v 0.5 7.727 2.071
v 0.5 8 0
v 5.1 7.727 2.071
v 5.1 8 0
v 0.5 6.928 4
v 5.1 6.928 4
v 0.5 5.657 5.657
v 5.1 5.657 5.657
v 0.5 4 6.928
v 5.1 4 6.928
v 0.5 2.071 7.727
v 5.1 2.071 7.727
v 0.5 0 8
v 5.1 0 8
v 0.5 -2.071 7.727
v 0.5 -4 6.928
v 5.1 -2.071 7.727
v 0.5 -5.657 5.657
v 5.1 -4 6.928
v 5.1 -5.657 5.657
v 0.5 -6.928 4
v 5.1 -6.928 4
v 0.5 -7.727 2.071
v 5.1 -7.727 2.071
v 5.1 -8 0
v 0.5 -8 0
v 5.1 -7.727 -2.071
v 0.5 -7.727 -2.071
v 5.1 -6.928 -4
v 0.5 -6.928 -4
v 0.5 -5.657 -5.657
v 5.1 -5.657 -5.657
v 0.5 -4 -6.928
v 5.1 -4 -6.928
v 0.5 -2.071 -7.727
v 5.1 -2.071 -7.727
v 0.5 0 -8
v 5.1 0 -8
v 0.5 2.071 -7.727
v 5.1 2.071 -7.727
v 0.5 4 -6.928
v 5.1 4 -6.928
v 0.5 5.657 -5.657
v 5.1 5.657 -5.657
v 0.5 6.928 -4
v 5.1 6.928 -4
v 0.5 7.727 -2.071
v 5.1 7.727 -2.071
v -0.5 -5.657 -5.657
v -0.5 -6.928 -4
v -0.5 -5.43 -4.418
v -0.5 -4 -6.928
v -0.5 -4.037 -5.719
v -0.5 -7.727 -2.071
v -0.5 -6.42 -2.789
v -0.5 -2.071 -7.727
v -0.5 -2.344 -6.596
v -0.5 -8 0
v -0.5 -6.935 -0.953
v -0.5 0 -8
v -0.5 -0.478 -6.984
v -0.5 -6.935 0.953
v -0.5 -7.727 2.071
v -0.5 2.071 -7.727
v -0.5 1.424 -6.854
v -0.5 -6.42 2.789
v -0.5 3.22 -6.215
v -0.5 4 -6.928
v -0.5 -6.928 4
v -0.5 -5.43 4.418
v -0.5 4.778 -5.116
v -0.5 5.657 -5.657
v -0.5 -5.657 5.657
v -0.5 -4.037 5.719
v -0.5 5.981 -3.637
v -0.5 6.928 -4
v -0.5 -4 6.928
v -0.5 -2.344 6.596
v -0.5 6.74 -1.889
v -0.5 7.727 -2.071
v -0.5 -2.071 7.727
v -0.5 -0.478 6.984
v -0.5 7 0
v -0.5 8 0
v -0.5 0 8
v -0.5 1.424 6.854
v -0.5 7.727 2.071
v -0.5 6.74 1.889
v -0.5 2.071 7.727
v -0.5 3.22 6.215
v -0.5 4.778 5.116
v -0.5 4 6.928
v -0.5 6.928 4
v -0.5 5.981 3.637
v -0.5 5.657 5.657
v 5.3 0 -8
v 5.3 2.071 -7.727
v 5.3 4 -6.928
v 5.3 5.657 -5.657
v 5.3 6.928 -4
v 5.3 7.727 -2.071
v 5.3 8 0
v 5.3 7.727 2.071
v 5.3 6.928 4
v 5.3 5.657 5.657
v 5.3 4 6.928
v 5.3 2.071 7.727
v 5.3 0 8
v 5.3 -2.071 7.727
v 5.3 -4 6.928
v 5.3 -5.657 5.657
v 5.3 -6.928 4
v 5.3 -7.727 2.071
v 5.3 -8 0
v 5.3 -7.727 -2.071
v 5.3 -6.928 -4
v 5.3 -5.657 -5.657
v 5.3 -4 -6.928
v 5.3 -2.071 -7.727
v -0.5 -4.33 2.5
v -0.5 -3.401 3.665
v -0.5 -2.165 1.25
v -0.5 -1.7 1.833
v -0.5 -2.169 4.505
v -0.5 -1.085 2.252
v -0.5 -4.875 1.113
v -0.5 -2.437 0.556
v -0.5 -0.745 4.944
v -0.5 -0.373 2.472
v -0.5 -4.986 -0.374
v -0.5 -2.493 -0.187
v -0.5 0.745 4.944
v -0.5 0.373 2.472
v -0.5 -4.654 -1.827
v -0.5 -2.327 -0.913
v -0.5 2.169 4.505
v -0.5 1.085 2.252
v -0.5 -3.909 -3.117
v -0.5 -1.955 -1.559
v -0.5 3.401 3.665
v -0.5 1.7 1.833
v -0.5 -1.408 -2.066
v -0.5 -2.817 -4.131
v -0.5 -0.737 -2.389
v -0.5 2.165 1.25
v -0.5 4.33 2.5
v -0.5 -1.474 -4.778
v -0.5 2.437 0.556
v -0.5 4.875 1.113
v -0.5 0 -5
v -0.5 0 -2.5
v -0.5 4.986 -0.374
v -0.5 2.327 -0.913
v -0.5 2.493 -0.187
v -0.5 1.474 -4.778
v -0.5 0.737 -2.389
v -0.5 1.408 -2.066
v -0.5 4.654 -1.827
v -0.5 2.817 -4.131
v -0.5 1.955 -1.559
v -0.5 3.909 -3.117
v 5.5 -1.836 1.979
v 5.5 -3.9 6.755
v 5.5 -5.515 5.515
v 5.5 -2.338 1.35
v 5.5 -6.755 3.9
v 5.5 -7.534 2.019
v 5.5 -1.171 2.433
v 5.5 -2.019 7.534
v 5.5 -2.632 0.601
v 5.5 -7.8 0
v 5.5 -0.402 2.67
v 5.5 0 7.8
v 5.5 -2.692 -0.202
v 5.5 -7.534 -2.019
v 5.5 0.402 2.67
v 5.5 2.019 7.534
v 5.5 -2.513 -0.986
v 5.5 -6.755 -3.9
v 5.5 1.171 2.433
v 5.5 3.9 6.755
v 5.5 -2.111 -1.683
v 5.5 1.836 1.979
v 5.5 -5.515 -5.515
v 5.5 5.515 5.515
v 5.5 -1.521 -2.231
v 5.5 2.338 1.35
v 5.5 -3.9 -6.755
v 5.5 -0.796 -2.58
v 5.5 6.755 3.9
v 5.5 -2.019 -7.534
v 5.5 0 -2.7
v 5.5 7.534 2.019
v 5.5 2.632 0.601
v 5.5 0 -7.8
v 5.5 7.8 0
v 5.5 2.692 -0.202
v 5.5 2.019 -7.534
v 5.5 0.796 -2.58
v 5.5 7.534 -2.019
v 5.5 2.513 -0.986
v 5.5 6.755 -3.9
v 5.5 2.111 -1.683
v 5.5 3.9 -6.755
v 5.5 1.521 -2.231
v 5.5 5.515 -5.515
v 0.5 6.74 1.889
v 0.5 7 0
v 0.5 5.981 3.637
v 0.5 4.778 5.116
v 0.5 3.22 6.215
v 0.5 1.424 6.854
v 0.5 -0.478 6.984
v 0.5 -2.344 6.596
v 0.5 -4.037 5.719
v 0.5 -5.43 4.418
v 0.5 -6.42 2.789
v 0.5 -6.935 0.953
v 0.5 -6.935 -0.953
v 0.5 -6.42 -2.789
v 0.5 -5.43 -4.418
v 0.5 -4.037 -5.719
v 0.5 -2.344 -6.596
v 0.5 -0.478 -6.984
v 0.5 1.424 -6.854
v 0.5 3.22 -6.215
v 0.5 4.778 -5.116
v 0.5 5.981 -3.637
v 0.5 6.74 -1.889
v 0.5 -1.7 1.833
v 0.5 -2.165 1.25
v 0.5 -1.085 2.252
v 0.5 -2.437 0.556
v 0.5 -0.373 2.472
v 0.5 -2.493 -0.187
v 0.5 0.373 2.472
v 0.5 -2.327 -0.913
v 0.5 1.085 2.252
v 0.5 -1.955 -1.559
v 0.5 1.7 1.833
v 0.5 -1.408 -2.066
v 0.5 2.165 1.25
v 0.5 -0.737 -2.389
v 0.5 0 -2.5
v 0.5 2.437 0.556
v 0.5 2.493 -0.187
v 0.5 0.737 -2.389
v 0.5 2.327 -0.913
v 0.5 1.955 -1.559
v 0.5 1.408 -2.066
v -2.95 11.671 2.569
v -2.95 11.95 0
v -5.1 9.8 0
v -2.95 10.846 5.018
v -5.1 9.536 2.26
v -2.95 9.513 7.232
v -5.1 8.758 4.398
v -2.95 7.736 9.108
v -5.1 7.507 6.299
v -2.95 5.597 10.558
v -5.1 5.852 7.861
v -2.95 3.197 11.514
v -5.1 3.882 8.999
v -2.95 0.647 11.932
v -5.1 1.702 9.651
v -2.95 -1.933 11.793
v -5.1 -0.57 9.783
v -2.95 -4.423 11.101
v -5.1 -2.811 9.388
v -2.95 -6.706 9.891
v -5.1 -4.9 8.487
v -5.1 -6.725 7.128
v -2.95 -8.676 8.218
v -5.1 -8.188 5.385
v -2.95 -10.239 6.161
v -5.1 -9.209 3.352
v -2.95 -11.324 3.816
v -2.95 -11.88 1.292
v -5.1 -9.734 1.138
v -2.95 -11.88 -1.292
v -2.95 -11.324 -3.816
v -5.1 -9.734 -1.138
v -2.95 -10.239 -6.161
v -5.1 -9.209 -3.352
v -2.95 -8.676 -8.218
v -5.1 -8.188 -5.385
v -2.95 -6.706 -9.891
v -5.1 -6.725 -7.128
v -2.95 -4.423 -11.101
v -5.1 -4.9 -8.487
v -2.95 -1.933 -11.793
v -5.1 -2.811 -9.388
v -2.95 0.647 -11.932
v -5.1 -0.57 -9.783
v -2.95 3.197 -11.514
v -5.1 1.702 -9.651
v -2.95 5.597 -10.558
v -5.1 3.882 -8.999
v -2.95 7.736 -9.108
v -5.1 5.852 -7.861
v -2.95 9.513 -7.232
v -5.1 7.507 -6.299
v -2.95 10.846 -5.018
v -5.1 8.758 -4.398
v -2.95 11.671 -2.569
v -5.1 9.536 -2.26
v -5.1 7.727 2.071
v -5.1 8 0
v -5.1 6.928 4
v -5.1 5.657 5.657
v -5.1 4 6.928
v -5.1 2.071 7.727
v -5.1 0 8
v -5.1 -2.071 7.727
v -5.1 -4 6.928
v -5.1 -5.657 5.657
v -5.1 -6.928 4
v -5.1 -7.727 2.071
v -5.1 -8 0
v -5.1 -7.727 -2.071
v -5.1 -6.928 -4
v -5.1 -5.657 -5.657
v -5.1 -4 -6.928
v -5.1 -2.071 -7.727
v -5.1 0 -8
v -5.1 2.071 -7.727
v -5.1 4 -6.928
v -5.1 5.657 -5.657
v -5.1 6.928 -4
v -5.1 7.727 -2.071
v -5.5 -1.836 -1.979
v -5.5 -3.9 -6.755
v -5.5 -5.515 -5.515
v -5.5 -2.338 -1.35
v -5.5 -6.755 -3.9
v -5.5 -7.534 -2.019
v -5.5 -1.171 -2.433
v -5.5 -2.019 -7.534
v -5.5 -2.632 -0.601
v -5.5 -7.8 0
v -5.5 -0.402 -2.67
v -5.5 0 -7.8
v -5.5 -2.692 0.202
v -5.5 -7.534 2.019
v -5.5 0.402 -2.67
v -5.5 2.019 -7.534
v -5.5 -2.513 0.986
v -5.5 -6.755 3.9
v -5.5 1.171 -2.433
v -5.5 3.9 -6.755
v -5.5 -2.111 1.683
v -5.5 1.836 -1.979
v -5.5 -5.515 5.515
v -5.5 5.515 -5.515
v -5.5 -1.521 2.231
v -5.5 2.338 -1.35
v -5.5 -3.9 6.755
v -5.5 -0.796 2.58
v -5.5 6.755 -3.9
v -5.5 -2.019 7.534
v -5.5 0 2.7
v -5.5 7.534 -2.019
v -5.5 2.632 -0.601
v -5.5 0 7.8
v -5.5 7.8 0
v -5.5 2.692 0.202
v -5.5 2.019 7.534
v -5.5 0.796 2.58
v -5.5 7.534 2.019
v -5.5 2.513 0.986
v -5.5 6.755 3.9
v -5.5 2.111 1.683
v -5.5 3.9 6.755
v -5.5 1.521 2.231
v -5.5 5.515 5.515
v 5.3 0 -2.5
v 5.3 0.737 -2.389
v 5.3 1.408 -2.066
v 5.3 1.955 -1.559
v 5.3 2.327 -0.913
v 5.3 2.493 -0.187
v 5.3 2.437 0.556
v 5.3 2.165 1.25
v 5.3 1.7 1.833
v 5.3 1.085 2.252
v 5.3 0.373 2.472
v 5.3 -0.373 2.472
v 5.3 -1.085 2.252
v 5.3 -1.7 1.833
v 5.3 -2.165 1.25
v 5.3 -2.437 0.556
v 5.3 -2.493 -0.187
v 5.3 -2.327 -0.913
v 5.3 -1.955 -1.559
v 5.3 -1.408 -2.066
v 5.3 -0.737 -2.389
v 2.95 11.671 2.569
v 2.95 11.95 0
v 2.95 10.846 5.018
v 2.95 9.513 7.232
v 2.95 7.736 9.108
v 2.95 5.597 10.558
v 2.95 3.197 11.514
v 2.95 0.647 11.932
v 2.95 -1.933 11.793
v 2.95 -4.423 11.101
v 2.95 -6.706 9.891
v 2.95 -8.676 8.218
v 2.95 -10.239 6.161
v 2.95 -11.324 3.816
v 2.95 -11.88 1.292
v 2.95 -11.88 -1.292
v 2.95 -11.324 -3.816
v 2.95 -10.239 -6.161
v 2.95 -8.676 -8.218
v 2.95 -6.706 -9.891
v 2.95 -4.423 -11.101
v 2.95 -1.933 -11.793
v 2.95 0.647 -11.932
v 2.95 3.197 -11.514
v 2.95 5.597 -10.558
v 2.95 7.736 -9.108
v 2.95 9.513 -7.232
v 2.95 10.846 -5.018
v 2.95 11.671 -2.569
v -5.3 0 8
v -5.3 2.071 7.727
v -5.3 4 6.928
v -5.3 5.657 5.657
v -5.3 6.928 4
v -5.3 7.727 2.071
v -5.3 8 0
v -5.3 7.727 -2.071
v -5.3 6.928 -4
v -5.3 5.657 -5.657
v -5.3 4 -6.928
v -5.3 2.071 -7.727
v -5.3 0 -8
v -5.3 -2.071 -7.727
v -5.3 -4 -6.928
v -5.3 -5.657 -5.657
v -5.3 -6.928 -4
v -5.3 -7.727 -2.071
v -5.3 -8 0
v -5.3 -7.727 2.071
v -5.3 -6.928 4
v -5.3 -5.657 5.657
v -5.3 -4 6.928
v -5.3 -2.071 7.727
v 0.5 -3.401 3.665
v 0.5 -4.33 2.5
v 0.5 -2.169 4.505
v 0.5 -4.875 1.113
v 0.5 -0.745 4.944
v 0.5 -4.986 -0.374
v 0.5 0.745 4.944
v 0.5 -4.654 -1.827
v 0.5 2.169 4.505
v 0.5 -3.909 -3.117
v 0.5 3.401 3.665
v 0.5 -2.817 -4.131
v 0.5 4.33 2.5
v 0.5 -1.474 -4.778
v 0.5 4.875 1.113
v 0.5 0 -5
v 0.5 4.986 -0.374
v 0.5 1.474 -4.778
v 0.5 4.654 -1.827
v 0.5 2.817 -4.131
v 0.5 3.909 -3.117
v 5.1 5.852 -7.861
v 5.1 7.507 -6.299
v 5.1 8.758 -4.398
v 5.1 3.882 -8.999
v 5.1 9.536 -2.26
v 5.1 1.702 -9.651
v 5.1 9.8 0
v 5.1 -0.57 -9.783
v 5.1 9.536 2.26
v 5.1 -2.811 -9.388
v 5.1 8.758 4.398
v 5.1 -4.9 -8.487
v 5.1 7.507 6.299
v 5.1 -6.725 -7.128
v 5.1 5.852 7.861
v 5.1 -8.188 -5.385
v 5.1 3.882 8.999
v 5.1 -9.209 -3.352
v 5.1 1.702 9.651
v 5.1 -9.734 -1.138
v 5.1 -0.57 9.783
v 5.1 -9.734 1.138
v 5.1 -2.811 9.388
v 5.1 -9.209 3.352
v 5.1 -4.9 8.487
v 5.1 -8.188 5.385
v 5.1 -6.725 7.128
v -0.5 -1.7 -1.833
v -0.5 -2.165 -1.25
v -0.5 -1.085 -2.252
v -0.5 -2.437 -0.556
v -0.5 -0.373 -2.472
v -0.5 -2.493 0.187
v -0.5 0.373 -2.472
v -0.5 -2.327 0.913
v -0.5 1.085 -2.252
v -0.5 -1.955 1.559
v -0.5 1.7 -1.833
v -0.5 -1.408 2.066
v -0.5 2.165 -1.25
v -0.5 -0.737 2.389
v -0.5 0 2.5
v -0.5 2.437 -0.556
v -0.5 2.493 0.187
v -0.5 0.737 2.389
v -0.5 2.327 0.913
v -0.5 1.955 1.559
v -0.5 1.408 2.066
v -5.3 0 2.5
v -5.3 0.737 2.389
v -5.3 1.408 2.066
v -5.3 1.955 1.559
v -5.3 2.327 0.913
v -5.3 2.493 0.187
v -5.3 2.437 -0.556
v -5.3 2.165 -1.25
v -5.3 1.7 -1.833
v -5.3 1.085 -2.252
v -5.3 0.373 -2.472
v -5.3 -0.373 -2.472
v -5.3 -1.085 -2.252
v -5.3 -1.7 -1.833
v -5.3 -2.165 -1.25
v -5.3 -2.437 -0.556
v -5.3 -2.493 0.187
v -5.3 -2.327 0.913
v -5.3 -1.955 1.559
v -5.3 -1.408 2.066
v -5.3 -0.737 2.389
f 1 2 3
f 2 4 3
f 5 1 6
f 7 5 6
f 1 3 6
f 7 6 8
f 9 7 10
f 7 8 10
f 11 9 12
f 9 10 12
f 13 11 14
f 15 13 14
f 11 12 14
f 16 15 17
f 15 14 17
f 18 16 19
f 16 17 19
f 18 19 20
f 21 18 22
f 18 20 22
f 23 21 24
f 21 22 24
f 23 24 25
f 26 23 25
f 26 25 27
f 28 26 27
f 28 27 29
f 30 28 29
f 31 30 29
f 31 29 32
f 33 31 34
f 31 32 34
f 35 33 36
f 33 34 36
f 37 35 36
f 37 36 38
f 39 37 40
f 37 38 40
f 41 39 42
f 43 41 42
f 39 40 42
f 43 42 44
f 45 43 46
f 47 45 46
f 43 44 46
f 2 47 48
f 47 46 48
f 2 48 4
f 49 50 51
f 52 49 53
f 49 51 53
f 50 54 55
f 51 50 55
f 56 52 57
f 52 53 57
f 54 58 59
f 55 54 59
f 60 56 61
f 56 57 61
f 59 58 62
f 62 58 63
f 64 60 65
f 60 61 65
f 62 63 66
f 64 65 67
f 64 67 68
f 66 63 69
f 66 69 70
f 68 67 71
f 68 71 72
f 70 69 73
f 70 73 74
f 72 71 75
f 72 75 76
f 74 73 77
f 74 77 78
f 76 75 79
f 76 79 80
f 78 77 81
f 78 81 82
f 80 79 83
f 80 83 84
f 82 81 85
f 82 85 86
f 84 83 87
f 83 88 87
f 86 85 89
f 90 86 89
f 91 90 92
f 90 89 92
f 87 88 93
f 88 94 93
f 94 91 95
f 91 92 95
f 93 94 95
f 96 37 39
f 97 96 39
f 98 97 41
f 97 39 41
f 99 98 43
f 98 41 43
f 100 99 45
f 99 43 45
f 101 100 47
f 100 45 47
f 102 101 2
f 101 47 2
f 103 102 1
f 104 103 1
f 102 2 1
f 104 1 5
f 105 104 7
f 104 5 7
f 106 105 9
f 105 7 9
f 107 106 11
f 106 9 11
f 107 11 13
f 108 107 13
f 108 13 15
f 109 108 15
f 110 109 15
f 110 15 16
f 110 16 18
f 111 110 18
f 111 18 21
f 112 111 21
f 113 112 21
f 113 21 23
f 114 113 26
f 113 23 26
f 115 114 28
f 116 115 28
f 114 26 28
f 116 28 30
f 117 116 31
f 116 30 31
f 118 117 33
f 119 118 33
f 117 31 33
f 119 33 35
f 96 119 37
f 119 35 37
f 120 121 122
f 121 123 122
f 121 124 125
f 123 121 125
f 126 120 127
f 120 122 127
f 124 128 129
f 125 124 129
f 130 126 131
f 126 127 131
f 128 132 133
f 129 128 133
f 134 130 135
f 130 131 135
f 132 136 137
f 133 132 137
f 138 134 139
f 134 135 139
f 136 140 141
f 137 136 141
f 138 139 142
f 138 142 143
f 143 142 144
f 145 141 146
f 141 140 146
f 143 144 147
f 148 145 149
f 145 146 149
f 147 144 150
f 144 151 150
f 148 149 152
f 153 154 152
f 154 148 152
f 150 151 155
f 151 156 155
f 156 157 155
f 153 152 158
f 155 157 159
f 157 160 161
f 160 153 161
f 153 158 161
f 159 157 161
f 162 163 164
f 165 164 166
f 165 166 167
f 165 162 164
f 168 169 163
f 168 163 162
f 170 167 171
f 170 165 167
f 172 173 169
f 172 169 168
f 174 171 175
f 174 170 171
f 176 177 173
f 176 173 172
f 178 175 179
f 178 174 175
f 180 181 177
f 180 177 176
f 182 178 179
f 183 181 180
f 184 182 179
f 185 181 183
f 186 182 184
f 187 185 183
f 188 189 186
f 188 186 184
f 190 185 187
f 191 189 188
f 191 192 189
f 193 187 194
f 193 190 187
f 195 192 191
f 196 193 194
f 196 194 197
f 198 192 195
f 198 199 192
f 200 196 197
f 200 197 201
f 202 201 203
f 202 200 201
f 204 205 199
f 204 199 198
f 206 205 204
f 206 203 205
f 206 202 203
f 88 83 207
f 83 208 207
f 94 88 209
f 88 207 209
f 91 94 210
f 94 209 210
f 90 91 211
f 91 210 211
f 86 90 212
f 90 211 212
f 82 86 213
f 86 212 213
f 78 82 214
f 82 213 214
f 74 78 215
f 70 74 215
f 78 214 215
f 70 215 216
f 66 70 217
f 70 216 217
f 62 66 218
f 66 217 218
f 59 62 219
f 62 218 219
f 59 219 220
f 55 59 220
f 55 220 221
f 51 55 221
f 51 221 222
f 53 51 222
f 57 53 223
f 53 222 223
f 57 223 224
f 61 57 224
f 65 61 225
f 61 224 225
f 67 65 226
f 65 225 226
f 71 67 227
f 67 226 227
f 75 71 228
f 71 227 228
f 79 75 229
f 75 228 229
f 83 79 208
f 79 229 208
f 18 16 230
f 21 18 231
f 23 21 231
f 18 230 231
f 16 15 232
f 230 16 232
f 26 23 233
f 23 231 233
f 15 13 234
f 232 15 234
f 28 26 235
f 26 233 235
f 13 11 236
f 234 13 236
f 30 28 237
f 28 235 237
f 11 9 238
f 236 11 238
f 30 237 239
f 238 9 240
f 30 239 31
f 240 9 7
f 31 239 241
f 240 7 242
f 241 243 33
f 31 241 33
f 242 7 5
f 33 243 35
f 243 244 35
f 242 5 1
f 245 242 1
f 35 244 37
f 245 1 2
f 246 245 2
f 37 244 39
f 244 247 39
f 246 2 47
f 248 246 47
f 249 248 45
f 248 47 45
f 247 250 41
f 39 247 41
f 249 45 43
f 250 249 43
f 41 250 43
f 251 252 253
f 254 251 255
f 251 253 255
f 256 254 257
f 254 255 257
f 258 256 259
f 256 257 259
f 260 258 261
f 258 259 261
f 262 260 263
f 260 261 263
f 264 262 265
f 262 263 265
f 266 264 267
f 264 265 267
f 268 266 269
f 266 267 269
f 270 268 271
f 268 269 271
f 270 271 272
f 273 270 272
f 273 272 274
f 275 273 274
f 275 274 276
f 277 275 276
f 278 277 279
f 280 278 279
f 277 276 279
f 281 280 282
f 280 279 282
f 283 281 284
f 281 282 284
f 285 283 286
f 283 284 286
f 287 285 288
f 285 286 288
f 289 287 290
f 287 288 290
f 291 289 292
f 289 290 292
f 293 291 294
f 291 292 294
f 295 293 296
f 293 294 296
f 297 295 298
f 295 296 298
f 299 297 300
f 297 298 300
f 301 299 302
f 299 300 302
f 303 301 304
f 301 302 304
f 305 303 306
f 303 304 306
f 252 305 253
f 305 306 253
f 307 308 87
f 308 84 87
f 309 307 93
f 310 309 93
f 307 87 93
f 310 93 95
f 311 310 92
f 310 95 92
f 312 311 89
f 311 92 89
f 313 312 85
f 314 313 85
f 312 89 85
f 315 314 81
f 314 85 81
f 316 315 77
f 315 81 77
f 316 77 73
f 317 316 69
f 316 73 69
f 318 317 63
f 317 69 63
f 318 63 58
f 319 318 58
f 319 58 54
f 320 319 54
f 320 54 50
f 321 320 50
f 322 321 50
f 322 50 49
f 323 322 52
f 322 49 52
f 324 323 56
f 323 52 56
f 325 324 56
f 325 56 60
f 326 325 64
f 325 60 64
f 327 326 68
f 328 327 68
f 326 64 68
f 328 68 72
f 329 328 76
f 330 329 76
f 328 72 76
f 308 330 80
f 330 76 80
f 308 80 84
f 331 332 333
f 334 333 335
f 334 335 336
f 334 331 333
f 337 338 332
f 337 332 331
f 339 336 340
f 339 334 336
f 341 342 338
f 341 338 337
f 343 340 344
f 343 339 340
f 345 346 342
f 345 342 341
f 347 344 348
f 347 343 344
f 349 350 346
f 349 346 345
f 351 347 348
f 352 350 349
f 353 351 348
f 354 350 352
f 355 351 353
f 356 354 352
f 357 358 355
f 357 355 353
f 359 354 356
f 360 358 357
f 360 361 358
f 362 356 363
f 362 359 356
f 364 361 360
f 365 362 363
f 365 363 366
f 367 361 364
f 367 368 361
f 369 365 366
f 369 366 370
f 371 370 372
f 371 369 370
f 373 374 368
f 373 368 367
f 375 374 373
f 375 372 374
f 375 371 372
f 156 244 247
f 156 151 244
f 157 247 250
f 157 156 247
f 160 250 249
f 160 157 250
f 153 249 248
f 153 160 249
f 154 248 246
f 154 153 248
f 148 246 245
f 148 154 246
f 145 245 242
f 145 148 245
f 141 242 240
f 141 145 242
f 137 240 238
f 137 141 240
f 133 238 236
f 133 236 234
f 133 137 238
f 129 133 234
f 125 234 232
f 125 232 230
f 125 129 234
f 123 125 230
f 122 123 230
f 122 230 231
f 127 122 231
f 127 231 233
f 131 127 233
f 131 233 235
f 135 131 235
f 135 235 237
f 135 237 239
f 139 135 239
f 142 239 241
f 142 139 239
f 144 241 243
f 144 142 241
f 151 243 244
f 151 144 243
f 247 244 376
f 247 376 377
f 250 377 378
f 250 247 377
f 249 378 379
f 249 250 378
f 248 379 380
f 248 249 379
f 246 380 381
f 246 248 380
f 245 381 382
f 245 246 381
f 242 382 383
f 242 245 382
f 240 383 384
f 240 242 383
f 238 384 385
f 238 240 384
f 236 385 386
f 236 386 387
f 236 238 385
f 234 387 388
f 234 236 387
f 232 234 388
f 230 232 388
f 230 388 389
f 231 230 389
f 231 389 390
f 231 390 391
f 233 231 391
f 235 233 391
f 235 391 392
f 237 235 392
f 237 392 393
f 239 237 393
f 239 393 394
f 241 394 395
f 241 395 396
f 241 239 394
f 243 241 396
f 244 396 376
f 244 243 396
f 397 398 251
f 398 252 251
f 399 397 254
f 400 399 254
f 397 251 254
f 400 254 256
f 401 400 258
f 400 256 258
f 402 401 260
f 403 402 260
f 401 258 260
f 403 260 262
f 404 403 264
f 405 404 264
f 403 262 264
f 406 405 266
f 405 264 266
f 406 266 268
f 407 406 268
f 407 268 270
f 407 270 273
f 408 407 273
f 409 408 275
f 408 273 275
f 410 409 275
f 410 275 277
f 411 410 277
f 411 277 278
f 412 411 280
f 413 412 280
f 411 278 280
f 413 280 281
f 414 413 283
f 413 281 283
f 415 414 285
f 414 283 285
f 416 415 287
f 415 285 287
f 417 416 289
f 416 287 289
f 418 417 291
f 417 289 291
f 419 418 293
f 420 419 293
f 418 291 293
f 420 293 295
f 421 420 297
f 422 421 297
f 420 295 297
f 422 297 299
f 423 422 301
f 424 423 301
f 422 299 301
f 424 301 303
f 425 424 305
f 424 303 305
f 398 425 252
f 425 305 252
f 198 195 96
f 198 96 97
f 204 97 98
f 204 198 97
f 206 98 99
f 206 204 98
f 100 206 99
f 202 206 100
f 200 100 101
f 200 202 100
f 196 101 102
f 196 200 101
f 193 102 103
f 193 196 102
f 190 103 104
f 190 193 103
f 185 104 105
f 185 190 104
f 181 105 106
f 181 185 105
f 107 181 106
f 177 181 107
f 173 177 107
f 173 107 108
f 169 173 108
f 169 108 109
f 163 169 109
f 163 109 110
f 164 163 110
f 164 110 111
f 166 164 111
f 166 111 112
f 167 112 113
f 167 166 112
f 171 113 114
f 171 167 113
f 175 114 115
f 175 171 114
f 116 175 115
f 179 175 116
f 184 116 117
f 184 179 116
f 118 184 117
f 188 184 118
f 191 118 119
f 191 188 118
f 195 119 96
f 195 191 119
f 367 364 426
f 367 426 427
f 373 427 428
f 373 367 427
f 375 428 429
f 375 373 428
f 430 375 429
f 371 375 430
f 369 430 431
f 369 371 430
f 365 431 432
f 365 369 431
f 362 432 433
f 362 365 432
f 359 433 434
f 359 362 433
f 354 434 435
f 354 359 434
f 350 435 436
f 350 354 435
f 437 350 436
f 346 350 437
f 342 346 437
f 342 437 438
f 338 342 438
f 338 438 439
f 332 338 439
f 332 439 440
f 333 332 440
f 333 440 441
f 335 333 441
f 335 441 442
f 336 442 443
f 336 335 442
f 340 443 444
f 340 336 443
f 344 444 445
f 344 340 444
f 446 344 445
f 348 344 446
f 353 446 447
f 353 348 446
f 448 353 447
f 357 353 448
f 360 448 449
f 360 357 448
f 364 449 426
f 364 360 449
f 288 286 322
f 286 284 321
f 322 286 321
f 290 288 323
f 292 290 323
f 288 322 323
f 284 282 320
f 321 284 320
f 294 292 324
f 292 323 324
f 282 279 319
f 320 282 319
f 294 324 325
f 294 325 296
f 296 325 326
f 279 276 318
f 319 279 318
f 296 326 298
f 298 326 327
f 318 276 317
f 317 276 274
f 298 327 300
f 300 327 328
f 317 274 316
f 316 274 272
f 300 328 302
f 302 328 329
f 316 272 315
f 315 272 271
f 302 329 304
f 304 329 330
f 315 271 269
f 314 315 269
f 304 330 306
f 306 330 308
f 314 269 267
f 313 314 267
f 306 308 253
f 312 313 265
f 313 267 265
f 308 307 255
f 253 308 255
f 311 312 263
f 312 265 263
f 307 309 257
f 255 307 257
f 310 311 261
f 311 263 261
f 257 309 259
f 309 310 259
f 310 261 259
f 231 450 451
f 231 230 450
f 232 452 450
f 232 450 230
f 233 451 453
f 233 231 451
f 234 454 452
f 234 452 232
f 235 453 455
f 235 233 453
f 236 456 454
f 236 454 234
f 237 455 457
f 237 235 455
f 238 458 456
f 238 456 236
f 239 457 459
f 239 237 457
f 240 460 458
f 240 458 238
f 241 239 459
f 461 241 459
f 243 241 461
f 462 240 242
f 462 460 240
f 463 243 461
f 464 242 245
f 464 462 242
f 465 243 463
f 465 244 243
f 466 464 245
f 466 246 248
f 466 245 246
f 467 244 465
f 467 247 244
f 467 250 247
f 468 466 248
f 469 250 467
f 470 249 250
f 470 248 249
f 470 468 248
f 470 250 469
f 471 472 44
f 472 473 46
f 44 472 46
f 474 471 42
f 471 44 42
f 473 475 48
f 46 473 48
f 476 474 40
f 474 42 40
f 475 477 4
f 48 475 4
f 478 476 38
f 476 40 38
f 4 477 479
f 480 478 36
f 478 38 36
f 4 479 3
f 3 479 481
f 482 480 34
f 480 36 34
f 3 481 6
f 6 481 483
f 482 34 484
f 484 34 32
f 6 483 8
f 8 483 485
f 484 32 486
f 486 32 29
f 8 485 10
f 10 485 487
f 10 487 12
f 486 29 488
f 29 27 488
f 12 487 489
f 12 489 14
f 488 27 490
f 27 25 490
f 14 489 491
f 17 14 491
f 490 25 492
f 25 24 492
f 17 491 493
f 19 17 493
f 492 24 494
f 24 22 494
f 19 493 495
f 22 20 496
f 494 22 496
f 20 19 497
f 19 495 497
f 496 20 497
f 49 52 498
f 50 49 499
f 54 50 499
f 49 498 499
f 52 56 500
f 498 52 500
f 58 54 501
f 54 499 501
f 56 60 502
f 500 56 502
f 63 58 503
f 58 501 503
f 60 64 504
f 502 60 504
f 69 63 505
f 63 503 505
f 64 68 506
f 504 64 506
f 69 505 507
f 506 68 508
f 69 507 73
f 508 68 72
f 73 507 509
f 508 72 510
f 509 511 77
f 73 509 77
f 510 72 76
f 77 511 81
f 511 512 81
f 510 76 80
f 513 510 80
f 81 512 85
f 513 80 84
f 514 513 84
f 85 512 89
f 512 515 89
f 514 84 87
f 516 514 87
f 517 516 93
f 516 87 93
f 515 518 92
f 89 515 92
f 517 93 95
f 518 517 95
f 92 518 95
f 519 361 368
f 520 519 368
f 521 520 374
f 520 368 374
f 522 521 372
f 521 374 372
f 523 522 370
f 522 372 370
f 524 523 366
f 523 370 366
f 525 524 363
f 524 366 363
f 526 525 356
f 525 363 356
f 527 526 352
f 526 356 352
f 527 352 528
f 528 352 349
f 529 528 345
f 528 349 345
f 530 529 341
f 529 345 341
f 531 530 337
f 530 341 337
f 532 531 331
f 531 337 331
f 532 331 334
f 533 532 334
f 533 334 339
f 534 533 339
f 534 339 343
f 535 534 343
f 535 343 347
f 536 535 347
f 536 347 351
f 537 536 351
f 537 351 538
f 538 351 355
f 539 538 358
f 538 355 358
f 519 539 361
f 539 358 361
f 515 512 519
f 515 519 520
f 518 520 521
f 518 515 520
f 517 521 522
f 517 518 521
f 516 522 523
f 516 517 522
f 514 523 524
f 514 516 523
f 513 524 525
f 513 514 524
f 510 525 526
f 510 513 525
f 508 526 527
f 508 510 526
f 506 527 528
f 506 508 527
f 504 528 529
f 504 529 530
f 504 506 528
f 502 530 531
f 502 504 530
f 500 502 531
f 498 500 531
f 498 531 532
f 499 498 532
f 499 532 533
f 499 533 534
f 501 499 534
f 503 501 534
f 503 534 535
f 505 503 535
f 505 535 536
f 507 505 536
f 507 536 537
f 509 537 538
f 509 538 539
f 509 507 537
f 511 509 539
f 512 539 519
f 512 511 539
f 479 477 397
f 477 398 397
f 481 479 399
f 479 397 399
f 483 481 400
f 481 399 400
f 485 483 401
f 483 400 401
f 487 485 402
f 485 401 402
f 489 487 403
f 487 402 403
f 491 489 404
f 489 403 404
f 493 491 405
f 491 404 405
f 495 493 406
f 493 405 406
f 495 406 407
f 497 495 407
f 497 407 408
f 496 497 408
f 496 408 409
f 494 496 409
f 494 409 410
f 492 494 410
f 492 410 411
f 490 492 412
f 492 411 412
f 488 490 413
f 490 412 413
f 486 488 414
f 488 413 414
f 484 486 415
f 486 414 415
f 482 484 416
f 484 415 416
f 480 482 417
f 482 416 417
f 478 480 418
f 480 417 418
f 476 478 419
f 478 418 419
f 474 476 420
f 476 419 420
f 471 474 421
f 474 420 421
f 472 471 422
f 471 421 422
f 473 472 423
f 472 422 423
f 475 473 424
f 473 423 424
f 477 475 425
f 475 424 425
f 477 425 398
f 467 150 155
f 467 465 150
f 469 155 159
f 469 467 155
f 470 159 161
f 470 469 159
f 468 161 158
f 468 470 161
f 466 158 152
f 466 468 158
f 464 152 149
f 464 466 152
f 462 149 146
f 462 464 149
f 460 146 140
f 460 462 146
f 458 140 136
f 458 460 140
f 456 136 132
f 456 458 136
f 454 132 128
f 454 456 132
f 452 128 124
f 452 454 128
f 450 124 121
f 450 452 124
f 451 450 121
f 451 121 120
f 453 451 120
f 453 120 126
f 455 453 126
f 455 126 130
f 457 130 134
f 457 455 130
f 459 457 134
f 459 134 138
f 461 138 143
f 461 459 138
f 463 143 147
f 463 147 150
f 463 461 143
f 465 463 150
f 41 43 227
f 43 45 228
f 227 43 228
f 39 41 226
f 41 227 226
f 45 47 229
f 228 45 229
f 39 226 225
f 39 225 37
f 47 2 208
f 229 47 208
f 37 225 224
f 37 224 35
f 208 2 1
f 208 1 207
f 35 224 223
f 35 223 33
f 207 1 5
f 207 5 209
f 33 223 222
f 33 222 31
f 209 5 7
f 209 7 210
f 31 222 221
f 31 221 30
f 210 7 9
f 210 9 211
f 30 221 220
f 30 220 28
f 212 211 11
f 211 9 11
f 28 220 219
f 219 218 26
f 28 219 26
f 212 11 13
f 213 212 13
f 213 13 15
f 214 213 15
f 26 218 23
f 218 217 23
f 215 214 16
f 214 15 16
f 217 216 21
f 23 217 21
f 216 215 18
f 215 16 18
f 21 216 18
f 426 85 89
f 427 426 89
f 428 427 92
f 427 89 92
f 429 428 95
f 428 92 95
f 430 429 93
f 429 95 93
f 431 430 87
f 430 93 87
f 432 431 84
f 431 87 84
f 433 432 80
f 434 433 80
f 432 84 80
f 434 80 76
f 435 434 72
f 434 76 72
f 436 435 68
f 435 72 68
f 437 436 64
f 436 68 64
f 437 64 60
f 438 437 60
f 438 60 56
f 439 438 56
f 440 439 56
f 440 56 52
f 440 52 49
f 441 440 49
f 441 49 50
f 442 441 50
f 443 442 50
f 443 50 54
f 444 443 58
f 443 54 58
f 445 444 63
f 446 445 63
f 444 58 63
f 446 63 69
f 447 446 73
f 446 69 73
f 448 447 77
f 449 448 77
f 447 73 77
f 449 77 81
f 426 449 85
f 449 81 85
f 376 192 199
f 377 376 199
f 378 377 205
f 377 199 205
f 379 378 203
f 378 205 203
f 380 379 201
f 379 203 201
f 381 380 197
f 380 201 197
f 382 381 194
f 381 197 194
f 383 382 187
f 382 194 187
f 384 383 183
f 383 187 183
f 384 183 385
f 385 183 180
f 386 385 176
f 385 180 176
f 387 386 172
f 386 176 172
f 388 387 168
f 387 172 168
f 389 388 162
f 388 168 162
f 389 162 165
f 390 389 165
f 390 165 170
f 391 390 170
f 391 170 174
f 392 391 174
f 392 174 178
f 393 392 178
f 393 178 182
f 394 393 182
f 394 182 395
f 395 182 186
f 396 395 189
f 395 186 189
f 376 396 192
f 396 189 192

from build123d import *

# Parameters (mm, degrees)
SKETCH2_R           = 8
SKETCH2_R_2         = 2.5
BEARING_DEPTH       = 5
SKETCH3_R           = 5
SKETCH3_R_2         = 2.5
BOSS_EXTRUDE1_DEPTH = 0.5
SKETCH4_R           = 8
SKETCH4_R_2         = 2.5
BOSS_EXTRUDE2_DEPTH = 5
CHAMFER1_SIZE       = 0.2
CHAMFER2_SIZE       = 0.2


with BuildPart() as part:
    # Sketch1 → Revolve1 (revolve)
    with BuildSketch(Plane.XY):
        Polygon((-0.5, 8), (-0.5, 7), (0.5, 7), (0.5, 8), (5.1, 8), (5.1, 9.8), (2.95, 11.95), (-2.95, 11.95), (-5.1, 9.8), (-5.1, 8), align=None)
    revolve(axis=Axis((-5.1, 0, 0), (1, 0, 0)))


with BuildPart() as body_2:
    # Sketch2 → bearing (new body)
    with BuildSketch(Plane(origin=(0.5, 0, 0), x_dir=(0, 0, -1), z_dir=(1, 0, 0))):
        Circle(SKETCH2_R)
        Circle(SKETCH2_R_2, mode=Mode.SUBTRACT)
    extrude(amount=BEARING_DEPTH)

    # Chamfer1
    chamfer1_edges = [body_2.edges().sort_by_distance(p)[0] for p in [
        (5.5, 0, 8),
        (5.5, 0, 2.5),
    ]]
    chamfer(chamfer1_edges, length=CHAMFER1_SIZE)


with BuildPart() as body_3:
    # Sketch3 → Boss-Extrude1 (new body, symmetric)
    with BuildSketch(Plane(origin=(0, 0, 0), x_dir=(0, 0, -1), z_dir=(1, 0, 0))):
        Circle(SKETCH3_R)
        Circle(SKETCH3_R_2, mode=Mode.SUBTRACT)
    extrude(amount=BOSS_EXTRUDE1_DEPTH, both=True)


with BuildPart() as body_4:
    # Sketch4 → Boss-Extrude2 (new body)
    with BuildSketch(Plane.ZY.offset(0.5)):
        Circle(SKETCH4_R)
        Circle(SKETCH4_R_2, mode=Mode.SUBTRACT)
    extrude(amount=BOSS_EXTRUDE2_DEPTH)

    # Chamfer2
    chamfer2_edges = [body_4.edges().sort_by_distance(p)[0] for p in [
        (-5.5, 0, -8),
        (-5.5, 0, -2.5),
    ]]
    chamfer(chamfer2_edges, length=CHAMFER2_SIZE)


solid = Compound([part.part, body_2.part, body_3.part, body_4.part])
